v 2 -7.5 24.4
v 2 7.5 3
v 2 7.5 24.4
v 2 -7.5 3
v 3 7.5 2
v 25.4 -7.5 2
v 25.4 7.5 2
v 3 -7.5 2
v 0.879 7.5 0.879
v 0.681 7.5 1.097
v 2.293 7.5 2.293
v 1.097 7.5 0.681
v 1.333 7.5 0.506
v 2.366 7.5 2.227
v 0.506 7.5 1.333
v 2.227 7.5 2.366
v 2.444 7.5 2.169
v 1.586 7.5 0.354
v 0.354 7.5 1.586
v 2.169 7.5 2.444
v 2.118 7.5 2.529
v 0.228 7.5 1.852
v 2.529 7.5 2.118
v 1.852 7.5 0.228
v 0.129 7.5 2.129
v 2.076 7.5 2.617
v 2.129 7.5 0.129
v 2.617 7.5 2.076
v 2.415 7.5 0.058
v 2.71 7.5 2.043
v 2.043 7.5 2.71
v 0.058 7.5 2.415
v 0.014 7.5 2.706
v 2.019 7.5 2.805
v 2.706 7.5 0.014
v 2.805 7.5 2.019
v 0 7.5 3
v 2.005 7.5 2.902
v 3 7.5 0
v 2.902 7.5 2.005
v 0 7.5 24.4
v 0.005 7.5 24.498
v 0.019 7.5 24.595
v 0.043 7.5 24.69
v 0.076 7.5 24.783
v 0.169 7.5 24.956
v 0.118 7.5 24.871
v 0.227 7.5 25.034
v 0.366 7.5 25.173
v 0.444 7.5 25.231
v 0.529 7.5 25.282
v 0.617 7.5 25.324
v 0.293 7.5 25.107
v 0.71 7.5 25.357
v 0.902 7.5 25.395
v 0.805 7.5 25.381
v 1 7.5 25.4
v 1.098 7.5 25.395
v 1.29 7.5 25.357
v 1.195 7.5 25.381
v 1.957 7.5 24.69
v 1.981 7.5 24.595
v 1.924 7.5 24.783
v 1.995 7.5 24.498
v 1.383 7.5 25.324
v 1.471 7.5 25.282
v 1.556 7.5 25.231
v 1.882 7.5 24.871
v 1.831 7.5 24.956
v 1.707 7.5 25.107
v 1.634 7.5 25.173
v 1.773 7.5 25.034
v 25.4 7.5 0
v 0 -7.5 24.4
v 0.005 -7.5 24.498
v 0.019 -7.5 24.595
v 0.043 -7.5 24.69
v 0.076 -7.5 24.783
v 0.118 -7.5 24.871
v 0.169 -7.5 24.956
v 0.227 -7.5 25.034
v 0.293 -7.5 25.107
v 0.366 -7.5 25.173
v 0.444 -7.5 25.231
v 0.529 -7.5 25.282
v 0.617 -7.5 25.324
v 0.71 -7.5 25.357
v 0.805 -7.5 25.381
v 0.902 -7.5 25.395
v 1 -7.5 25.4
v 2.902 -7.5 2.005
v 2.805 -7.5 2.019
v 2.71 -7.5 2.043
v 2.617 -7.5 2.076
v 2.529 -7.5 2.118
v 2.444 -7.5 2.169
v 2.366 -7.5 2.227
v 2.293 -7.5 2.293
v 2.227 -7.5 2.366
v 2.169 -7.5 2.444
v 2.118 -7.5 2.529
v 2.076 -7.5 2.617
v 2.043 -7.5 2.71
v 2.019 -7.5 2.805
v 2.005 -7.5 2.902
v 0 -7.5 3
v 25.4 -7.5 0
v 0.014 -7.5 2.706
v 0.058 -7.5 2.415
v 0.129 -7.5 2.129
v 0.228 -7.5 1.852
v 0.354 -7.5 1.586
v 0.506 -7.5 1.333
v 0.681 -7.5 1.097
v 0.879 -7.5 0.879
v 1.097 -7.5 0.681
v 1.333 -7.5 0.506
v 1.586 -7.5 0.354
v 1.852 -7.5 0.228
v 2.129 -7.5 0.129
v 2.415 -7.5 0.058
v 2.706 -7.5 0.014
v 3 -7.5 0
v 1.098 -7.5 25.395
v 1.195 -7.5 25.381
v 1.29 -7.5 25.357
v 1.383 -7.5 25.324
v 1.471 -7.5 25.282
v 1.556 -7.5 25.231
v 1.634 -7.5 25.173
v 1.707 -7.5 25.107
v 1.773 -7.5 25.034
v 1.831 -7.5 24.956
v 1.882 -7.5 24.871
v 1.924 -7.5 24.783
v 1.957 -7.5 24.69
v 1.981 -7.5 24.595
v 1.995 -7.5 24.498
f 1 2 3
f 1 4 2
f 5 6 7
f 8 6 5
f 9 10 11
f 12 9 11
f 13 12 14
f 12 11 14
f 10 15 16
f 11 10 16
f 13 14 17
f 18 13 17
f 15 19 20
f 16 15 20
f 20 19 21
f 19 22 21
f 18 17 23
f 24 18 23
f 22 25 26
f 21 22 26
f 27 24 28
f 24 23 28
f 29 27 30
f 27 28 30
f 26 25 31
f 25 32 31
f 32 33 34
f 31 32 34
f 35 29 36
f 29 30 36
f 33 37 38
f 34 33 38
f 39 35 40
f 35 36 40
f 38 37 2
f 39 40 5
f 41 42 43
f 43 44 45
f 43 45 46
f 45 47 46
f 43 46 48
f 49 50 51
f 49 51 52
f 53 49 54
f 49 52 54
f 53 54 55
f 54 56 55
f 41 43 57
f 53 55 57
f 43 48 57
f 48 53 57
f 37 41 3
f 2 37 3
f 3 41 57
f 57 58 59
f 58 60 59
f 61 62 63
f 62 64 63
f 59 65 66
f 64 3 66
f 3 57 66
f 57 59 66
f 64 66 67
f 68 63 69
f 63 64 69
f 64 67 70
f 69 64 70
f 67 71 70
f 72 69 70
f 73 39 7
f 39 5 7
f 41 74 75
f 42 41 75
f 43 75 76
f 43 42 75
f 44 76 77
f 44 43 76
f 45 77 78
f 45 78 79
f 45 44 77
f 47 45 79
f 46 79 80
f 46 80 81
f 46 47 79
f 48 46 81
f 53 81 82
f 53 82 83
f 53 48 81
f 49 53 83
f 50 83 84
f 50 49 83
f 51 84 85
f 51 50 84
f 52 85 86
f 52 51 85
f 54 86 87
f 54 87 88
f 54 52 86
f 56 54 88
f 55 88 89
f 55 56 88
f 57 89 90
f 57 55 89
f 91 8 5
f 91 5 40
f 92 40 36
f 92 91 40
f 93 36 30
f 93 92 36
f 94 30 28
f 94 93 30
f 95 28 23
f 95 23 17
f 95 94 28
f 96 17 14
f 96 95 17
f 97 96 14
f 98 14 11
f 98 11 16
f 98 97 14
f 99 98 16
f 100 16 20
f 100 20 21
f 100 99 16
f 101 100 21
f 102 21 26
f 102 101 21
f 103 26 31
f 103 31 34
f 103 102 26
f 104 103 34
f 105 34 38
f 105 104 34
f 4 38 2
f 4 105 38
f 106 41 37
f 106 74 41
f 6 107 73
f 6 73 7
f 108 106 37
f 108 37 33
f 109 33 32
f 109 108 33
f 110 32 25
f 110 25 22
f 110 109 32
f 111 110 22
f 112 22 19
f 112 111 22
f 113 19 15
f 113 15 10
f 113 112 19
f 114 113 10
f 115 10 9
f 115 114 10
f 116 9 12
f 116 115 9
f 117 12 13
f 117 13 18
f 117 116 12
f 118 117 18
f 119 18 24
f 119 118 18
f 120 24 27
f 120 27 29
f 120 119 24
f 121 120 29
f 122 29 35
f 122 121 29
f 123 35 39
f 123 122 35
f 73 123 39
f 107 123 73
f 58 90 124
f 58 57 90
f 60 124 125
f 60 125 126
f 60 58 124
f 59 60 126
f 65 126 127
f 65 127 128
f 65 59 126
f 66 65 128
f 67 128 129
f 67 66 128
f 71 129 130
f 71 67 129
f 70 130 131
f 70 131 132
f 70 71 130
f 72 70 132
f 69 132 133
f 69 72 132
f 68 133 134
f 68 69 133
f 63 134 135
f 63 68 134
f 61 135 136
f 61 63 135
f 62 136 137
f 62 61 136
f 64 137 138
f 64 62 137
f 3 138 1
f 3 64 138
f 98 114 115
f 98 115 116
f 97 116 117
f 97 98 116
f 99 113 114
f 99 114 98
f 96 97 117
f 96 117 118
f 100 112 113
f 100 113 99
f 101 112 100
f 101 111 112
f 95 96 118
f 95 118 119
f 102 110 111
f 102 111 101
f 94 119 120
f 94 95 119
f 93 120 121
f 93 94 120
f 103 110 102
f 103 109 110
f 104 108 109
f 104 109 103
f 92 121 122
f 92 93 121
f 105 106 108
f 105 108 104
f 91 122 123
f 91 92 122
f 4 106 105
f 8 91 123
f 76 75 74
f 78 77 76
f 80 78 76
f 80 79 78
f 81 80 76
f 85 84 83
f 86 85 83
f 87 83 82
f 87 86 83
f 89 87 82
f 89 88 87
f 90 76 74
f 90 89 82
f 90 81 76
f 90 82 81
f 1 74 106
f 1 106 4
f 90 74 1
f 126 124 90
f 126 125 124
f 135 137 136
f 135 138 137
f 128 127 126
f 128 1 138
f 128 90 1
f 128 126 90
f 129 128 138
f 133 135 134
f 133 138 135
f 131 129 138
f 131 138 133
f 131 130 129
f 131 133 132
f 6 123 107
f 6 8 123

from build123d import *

# Parameters (mm, degrees)
F1_DEPTH = 7.5
F2_R     = 0.99999


# Not quite as in the source:
# - a fillet or chamfer is up to 0.001 mm smaller than in the source, because OpenCascade refuses the exact size


with BuildPart() as f1:
    # F0 (on Front) → F1 (new body, symmetric)
    with BuildSketch(Plane.XZ):
        with BuildLine():
            Line((0, 25.4), (0, 3))
            ThreePointArc((0, 3), (0.8786796564, 0.8786796564), (3, 0))
            Line((3, 0), (25.4, 0))
            Line((25.4, 0), (25.4, 2))
            Line((25.4, 2), (3, 2))
            ThreePointArc((3, 2), (2.2928932188, 2.2928932188), (2, 3))
            Line((2, 3), (2, 25.4))
            Line((2, 25.4), (0, 25.4))
        make_face()
    extrude(amount=F1_DEPTH, both=True)

    # F2 (radius 1 in the source; OpenCascade refuses exactly that, so slightly less here)
    f2_edges = [f1.edges().sort_by_distance(p)[0] for p in [
        (2, 0, 25.4),
        (0, 0, 25.4),
    ]]
    fillet(f2_edges, radius=F2_R)


solid = f1.part
